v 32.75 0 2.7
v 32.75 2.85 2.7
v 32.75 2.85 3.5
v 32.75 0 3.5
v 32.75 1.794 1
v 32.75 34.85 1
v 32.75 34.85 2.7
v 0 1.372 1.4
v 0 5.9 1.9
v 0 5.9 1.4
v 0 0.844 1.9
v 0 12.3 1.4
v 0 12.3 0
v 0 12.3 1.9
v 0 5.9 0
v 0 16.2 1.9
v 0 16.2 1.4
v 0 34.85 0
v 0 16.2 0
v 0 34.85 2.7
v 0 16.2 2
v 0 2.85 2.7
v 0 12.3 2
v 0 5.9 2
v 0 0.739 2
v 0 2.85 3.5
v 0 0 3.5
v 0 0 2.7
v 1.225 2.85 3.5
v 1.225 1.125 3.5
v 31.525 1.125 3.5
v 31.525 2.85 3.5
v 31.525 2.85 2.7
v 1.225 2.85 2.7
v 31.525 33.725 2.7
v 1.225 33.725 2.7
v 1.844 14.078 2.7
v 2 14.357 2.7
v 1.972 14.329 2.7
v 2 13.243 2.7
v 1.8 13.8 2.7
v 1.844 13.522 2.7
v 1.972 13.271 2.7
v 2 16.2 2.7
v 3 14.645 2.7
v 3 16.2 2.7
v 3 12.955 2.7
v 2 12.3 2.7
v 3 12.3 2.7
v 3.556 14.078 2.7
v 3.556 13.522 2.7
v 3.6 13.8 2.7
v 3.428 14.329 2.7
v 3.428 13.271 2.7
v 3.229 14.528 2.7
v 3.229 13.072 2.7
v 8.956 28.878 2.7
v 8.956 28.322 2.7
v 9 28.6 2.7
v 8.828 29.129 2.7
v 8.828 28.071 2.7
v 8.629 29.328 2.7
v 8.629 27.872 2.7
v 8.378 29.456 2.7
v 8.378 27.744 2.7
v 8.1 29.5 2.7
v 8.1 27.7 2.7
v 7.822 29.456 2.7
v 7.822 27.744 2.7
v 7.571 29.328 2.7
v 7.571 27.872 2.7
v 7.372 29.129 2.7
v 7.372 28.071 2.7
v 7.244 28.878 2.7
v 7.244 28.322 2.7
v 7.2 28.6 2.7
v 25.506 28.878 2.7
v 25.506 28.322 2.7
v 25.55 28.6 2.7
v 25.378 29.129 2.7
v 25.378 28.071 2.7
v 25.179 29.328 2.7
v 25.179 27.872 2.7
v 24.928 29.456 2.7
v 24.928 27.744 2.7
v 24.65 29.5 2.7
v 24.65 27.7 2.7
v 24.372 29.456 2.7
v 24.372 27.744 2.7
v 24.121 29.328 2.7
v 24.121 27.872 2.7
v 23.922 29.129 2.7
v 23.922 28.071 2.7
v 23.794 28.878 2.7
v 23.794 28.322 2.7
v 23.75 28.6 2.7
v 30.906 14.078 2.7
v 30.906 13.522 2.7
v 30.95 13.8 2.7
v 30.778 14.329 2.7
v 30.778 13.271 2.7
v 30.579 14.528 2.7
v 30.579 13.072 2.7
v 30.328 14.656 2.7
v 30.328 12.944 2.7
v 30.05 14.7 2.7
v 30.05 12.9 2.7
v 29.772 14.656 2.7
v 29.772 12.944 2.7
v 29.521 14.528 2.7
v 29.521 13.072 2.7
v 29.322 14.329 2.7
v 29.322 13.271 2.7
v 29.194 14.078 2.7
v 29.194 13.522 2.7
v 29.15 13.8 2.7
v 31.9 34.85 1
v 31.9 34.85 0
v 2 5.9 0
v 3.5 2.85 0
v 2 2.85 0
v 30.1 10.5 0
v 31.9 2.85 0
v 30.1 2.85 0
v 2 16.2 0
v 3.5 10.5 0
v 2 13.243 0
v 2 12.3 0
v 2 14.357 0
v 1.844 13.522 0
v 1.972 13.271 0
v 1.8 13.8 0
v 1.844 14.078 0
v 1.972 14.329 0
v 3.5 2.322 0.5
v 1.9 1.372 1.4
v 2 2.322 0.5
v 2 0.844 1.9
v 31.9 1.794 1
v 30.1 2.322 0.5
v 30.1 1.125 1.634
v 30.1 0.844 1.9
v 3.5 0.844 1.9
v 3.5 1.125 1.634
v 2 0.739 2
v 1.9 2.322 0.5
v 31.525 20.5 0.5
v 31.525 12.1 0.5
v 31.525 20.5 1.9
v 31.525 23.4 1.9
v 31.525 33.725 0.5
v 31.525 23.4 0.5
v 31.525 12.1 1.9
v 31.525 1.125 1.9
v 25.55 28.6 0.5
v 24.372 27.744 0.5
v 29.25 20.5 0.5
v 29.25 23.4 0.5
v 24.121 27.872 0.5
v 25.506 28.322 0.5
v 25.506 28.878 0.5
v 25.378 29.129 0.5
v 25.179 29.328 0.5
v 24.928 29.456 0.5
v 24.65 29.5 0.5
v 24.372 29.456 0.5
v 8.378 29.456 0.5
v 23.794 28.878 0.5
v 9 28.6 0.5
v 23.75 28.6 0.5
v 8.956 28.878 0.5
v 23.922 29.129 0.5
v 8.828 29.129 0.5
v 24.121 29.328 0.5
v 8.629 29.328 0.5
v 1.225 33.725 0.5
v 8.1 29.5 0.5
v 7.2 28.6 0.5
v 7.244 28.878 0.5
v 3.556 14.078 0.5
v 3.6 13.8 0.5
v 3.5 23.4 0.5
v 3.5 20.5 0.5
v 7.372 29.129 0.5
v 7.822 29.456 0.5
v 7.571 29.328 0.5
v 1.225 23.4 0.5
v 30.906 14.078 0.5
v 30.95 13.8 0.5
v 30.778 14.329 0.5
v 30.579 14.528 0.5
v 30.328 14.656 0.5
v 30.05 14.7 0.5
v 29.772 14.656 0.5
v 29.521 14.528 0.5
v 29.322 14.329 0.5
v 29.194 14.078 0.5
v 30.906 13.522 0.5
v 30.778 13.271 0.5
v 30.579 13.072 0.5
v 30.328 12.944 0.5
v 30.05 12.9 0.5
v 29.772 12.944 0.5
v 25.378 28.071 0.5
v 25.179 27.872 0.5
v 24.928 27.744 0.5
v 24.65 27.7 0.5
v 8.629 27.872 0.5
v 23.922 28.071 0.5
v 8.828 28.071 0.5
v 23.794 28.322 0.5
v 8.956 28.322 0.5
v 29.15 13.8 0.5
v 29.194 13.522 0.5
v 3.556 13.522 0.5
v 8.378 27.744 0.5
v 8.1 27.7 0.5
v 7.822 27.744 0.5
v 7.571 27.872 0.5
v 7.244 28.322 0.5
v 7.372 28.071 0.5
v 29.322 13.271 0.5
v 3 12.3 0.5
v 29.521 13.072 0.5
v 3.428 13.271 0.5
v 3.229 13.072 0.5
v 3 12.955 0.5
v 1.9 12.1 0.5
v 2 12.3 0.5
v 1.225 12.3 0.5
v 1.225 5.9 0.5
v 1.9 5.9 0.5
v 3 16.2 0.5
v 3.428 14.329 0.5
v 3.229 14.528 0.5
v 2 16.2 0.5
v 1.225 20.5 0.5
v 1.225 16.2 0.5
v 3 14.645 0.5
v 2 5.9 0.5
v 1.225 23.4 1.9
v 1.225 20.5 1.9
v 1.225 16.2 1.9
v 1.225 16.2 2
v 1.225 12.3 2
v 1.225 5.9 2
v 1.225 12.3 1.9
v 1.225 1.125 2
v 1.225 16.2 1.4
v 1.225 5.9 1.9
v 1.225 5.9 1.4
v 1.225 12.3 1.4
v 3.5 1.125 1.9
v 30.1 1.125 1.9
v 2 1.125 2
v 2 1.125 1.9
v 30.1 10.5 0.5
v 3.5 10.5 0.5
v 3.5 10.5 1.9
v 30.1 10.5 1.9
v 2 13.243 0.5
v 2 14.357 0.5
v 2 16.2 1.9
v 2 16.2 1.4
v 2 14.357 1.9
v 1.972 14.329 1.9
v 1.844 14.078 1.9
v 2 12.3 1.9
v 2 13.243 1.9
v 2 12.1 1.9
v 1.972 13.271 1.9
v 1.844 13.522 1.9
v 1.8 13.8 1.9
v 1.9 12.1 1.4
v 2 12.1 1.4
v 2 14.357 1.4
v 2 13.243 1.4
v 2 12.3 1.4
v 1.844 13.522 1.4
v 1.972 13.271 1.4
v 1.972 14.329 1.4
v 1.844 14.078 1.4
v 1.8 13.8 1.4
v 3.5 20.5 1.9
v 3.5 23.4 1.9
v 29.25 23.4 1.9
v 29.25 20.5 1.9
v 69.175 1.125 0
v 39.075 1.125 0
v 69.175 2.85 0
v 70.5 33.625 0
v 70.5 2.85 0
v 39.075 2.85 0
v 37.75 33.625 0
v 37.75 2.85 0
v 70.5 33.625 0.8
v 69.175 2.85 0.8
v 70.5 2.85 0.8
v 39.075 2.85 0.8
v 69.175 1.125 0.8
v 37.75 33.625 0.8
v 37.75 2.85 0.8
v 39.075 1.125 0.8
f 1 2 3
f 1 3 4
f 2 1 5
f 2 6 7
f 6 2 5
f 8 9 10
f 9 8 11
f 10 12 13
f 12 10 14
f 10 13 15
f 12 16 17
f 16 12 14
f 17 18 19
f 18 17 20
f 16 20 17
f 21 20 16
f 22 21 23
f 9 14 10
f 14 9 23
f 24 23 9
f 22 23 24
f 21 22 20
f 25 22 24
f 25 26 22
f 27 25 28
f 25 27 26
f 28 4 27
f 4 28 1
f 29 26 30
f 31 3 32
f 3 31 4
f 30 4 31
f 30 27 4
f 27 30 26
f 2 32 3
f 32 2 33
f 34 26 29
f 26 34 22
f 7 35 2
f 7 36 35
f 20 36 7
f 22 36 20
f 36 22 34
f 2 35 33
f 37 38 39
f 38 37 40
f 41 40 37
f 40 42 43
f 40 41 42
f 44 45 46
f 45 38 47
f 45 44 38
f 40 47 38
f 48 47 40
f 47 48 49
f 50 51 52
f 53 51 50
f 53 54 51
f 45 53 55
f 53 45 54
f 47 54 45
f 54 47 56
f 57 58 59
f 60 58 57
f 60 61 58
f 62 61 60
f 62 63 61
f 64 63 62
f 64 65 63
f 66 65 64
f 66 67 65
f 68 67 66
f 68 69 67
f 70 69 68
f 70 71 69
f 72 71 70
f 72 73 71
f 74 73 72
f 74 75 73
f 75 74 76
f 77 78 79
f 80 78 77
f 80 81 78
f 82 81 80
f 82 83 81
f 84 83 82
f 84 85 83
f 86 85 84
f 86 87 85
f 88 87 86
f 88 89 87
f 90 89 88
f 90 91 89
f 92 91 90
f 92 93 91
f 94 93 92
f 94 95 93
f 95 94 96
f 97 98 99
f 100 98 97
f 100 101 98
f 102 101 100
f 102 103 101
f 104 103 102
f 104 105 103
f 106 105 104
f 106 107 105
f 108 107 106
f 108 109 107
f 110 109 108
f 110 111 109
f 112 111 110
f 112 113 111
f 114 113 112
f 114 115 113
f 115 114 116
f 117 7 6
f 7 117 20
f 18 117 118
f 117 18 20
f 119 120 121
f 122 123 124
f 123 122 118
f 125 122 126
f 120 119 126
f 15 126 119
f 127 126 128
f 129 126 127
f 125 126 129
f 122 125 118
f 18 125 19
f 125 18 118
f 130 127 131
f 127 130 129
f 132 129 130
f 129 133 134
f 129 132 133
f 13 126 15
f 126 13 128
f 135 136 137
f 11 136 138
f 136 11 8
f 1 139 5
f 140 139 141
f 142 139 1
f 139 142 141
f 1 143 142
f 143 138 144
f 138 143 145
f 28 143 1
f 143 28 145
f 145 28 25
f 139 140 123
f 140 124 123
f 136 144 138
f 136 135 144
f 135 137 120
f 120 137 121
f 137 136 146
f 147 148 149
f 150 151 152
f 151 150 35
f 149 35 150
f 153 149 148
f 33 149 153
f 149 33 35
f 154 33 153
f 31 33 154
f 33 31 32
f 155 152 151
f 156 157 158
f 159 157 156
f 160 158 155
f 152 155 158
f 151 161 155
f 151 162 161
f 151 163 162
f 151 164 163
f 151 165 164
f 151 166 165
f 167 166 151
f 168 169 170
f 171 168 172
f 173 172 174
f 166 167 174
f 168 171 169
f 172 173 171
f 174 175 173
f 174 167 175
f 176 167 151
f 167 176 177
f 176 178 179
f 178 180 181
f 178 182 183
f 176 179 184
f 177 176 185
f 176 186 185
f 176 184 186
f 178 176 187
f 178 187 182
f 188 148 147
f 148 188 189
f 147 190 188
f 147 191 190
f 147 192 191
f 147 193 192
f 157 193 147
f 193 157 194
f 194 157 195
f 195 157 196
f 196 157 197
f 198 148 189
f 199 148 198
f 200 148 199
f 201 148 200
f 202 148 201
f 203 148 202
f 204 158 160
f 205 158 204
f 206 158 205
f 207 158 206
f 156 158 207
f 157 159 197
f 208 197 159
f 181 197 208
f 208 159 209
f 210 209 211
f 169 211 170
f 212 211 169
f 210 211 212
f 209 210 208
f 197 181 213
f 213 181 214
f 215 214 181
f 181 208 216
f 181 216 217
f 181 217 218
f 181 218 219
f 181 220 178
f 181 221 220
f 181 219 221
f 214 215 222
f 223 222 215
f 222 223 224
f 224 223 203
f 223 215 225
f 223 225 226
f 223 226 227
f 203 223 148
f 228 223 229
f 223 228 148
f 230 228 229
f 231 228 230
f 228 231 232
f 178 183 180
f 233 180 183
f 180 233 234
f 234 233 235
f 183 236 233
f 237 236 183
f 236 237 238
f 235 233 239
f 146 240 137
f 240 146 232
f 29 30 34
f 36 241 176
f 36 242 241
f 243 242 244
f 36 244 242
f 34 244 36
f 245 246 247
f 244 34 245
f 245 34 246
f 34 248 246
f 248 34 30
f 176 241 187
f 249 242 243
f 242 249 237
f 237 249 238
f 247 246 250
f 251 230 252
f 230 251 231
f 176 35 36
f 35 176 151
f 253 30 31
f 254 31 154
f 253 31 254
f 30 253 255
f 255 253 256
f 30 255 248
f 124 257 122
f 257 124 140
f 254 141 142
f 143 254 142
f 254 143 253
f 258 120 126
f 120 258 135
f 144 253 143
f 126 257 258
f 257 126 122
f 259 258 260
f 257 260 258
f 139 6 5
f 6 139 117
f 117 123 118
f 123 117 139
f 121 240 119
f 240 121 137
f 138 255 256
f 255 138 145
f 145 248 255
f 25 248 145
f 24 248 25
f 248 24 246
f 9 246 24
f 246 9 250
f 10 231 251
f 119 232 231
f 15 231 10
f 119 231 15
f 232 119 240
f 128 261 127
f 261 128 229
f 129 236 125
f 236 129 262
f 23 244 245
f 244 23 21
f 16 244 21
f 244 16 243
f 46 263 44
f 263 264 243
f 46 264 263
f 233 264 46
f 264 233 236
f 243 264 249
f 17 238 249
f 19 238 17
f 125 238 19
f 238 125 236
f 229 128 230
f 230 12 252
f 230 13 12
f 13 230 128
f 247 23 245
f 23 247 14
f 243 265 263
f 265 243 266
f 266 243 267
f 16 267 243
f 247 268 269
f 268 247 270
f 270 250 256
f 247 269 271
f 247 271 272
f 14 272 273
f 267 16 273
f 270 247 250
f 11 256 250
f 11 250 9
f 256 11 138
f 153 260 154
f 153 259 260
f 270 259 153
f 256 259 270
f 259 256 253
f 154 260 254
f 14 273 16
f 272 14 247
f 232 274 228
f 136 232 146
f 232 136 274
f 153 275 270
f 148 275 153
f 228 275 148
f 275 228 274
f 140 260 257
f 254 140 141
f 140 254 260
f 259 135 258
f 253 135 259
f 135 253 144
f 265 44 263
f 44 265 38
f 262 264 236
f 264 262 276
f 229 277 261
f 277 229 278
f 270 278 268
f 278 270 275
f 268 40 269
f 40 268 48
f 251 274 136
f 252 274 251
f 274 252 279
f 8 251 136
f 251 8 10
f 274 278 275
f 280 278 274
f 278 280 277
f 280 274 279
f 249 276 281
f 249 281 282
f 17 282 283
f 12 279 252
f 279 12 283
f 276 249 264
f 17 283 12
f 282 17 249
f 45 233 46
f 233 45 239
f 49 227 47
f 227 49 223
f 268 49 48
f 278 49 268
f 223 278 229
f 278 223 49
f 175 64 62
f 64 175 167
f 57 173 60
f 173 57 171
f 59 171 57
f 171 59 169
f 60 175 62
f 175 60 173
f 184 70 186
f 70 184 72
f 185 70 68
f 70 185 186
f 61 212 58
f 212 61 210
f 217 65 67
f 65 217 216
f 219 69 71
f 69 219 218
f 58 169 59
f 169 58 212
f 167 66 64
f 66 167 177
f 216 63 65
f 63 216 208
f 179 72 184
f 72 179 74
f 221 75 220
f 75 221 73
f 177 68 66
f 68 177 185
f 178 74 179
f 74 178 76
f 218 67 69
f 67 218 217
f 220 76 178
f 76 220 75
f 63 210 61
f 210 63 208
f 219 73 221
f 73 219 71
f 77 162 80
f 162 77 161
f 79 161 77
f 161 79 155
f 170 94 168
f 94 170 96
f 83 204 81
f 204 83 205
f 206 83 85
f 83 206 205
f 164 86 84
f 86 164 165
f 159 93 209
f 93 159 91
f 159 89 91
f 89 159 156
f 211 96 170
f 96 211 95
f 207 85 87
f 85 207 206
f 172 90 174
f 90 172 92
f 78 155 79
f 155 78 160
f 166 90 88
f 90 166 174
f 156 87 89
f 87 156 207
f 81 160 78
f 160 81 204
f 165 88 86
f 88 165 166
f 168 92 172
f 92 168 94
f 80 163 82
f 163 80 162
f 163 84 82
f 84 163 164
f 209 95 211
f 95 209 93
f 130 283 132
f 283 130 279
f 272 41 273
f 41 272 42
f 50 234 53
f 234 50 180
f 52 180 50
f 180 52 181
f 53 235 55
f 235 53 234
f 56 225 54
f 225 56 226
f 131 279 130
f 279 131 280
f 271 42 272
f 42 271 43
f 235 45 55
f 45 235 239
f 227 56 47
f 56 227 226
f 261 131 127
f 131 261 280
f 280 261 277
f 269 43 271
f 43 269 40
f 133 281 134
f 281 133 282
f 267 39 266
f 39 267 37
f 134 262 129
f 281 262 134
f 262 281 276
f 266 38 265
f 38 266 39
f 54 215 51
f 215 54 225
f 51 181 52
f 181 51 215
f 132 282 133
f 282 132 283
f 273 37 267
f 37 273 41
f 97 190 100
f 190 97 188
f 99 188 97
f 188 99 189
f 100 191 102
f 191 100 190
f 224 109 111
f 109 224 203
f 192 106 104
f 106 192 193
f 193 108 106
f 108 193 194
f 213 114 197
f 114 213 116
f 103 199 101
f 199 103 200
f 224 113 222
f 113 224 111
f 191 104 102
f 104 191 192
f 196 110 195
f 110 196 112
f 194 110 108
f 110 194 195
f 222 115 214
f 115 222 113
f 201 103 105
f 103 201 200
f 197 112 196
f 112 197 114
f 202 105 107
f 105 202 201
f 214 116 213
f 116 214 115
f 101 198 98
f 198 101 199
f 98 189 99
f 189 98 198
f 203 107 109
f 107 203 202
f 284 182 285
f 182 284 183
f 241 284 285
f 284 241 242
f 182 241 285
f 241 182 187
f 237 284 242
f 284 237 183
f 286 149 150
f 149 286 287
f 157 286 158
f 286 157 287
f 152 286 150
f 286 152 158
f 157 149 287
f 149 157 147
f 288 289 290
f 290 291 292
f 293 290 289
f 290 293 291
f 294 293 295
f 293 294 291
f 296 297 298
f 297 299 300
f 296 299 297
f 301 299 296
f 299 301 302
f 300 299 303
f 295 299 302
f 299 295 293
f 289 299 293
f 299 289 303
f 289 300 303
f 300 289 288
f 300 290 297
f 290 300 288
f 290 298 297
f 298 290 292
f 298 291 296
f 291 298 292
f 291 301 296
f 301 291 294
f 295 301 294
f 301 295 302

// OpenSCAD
/* [General] */
// Create slats between contacts (requires hi-res printer!)
contact_slats = false;

// Punch hole through center (faster printing)
fast_print = false;

/* [Alignment Peg Dimensions] */

// Alignment peg diameter
peg_dia = 1.8;

// Vertical offset of top pegs
top_peg_vert_offset = 28.6;

// Horizontal offset of top pegs
top_peg_horiz_offset = 8.1;

// Vertical offset of middle pegs
mid_peg_vert_offset = 13.8;

// Horizontal offset of middle pegs
mid_peg_horiz_offset = 2.7;

/* [Thickness Adjustment] */

// Front-half depth (label-side)
label_depth = 0.8;

// PCB thickness, used to calculate standoff height
pcb_depth = 0.8;
// TODO: measure this

// Depth of plastic behind PCB
behind_pcb_depth = 0.5;

/* [Standoff Dimensions] */
// Vertical offset for board standoffs
standoff_vert_offset = 20.5;

/* [Hidden] */
$fn = 20;

// Cartridge depth (including front-half)
card_depth = 3.5;

// Polygon defining the side profile of a DS cartridge
ds_card_side_profile = [
    [0,0],
    [32,0],
    [34.85,card_depth - label_depth],
    [34.85,card_depth],
    [32,card_depth],
    [32,card_depth - label_depth],
    [0,card_depth - label_depth]
];

// Size of well for PCB
ds_card_center = [30.3,32.6,card_depth - behind_pcb_depth];

// assume a cuboid DS card in a vacuum...
// Overall dimensions of the cards, used for other calculations
ds_card_cube = [32.75,34.85,card_depth];

card_center_offset = [
    (ds_card_cube[0] - ds_card_center[0])/2,
    (ds_card_cube[1] - ds_card_center[1])/2,
    behind_pcb_depth
];

// Tolerance for label side
ds_label_tolerance = 0.1;

// Polygon defining the front half (label side)
ds_label_outline = [
    [0,card_center_offset[0]],
    [ds_card_cube[0],card_center_offset[0]],
    [ds_card_cube[0],ds_card_side_profile[1][0]],
    [ds_card_cube[0]-card_center_offset[0]-ds_label_tolerance,ds_card_side_profile[1][0]],
    [ds_card_cube[0]-card_center_offset[0]-ds_label_tolerance,ds_card_side_profile[2][0] - card_center_offset[1]],
    [card_center_offset[0]+ds_label_tolerance,ds_card_side_profile[2][0] - card_center_offset[1]],
    [card_center_offset[0]+ds_label_tolerance,ds_card_side_profile[1][0]],
    [0,ds_card_side_profile[1][0]]
];

// Standoff height
pcb_standoff_height =
    (card_depth - label_depth) -
    behind_pcb_depth -
    pcb_depth;

// Board standoff size
standoff = [2.5,2.9,pcb_standoff_height];

// Game Card contact dimensions
ds_card_pins = 17; // number of contacts
pin_width = 1.5; // width of an individual contact
pin_spacing = 26.6/ds_card_pins;

// Module using the side-profile polygon
// to create a solid DS Card (with lip for top half)
module ds_card_primitive() {
    translate([ds_card_cube[0],ds_card_cube[1],0])
    rotate([90,0,-90])
    linear_extrude(32.75)
    polygon(ds_card_side_profile);
}

// Module defining the plastic between contacts
// NOTE: does not print correctly on Ender 3 at highest res
// not a priority as this plastic is not required
module ds_card_pins_module() {
    difference() {
        cube([29.8,12.1,pcb_standoff_height]);
        translate([1.6,0,0])
        if (contact_slats) {
            for (i = [0 : ds_card_pins-1]) {
                translate([i*pin_spacing,0,0])
                cube([pin_width,10.5,1.3]);
            }
        } else {
            cube([
                ds_card_pins*pin_spacing,
                10.5,
                pcb_standoff_height
            ]);
        }
    }
}

// Shorthand module for the PCB alignment peg
// just a cylinder w/ fixed vars
module alignment_peg() {
    cylinder(h=ds_card_cube[2],d=peg_dia);
}

// assembly
// puts everything together
module ds_card_assembly() {
    difference() {
        ds_card_primitive();
        translate(card_center_offset)
            cube(ds_card_center);

        // Cutout for cartridge pins
        // TODO make less magic-numbery
        translate([3.5,0,0])
            cube([26.6,10.5,pcb_standoff_height+behind_pcb_depth]);
        
        // side cut "A"
        // long groove down left side of cartridge
        translate([31.9,0,0])
            cube([
                1,
                ds_card_cube[1],
                1
            ]);
        // side cut "B"
        // first cut on right side, near contacts
        translate([0,0,0])
            cube([
                2,
                5.9,
                2
            ]);
        // side cut "C"
        // second cut on right side, above "B"
        translate([0,12.3,0])
            cube([
                2,
                3.9,
                2
            ]);

        // rapid prototype hole (fast print)
        if(fast_print) {
            translate([ds_card_cube[0]/2,ds_card_cube[1]/2,0])
            cube([
                ds_card_cube[0]-(mid_peg_horiz_offset*2)-(peg_dia*2),
                ds_card_cube[1] / 2,
                ds_card_cube[2]*2
            ],center=true);
            translate([ds_card_cube[0]/2,ds_card_cube[1]/2,0])
            cube([
                ds_card_cube[0]-(top_peg_horiz_offset*2)-(peg_dia*2),
                ds_card_cube[1] - card_center_offset[1] - 2, // sorry
                ds_card_cube[2]*2
            ],center=true);
        }
    }
    // support for side cuts
    translate([0,0,pcb_standoff_height+behind_pcb_depth-0.5]) 
        cube([2,16.2,0.5]);
    translate([2,12.3,behind_pcb_depth])
        cube([1,3.9,ds_card_cube[2]]);
    
    translate([1.9,0,behind_pcb_depth])
    ds_card_pins_module();
    
    // top alignment pegs
    translate([
        top_peg_horiz_offset,
        top_peg_vert_offset,
        0
    ]) alignment_peg();
    translate([
        ds_card_cube[0]-top_peg_horiz_offset,
        top_peg_vert_offset,
        0
    ]) alignment_peg();
    
    // middle alignment pegs
    translate([
        mid_peg_horiz_offset,
        mid_peg_vert_offset,
        0
    ]) alignment_peg();
    translate([
        ds_card_cube[0]-mid_peg_horiz_offset,
        mid_peg_vert_offset,
        0
    ]) alignment_peg();
    
    // board standoffs
    translate([
        1,
        standoff_vert_offset,
        behind_pcb_depth
    ]) cube(standoff);
    translate([
        ds_card_cube[0]-(standoff[0]+1),
        standoff_vert_offset,
        behind_pcb_depth
    ]) cube(standoff);
}

// render
// clean up stray edges
intersection() {
    ds_card_primitive();
    ds_card_assembly();
}

// front of card, for funnies
translate([
    ds_card_cube[0] + 5,
    0,
    0
])

// card "lid"
translate([ds_card_cube[0],ds_card_cube[1],0])
rotate(180)
difference() {
    linear_extrude(label_depth)
    polygon(ds_label_outline);

    if(fast_print) {
        translate([ds_card_cube[0]/2,ds_card_cube[1]/2,0])
        cube([
            ds_card_cube[0]-8,
            ds_card_cube[1]/2,
            ds_card_cube[2]*2
        ],center=true);
    }
}
